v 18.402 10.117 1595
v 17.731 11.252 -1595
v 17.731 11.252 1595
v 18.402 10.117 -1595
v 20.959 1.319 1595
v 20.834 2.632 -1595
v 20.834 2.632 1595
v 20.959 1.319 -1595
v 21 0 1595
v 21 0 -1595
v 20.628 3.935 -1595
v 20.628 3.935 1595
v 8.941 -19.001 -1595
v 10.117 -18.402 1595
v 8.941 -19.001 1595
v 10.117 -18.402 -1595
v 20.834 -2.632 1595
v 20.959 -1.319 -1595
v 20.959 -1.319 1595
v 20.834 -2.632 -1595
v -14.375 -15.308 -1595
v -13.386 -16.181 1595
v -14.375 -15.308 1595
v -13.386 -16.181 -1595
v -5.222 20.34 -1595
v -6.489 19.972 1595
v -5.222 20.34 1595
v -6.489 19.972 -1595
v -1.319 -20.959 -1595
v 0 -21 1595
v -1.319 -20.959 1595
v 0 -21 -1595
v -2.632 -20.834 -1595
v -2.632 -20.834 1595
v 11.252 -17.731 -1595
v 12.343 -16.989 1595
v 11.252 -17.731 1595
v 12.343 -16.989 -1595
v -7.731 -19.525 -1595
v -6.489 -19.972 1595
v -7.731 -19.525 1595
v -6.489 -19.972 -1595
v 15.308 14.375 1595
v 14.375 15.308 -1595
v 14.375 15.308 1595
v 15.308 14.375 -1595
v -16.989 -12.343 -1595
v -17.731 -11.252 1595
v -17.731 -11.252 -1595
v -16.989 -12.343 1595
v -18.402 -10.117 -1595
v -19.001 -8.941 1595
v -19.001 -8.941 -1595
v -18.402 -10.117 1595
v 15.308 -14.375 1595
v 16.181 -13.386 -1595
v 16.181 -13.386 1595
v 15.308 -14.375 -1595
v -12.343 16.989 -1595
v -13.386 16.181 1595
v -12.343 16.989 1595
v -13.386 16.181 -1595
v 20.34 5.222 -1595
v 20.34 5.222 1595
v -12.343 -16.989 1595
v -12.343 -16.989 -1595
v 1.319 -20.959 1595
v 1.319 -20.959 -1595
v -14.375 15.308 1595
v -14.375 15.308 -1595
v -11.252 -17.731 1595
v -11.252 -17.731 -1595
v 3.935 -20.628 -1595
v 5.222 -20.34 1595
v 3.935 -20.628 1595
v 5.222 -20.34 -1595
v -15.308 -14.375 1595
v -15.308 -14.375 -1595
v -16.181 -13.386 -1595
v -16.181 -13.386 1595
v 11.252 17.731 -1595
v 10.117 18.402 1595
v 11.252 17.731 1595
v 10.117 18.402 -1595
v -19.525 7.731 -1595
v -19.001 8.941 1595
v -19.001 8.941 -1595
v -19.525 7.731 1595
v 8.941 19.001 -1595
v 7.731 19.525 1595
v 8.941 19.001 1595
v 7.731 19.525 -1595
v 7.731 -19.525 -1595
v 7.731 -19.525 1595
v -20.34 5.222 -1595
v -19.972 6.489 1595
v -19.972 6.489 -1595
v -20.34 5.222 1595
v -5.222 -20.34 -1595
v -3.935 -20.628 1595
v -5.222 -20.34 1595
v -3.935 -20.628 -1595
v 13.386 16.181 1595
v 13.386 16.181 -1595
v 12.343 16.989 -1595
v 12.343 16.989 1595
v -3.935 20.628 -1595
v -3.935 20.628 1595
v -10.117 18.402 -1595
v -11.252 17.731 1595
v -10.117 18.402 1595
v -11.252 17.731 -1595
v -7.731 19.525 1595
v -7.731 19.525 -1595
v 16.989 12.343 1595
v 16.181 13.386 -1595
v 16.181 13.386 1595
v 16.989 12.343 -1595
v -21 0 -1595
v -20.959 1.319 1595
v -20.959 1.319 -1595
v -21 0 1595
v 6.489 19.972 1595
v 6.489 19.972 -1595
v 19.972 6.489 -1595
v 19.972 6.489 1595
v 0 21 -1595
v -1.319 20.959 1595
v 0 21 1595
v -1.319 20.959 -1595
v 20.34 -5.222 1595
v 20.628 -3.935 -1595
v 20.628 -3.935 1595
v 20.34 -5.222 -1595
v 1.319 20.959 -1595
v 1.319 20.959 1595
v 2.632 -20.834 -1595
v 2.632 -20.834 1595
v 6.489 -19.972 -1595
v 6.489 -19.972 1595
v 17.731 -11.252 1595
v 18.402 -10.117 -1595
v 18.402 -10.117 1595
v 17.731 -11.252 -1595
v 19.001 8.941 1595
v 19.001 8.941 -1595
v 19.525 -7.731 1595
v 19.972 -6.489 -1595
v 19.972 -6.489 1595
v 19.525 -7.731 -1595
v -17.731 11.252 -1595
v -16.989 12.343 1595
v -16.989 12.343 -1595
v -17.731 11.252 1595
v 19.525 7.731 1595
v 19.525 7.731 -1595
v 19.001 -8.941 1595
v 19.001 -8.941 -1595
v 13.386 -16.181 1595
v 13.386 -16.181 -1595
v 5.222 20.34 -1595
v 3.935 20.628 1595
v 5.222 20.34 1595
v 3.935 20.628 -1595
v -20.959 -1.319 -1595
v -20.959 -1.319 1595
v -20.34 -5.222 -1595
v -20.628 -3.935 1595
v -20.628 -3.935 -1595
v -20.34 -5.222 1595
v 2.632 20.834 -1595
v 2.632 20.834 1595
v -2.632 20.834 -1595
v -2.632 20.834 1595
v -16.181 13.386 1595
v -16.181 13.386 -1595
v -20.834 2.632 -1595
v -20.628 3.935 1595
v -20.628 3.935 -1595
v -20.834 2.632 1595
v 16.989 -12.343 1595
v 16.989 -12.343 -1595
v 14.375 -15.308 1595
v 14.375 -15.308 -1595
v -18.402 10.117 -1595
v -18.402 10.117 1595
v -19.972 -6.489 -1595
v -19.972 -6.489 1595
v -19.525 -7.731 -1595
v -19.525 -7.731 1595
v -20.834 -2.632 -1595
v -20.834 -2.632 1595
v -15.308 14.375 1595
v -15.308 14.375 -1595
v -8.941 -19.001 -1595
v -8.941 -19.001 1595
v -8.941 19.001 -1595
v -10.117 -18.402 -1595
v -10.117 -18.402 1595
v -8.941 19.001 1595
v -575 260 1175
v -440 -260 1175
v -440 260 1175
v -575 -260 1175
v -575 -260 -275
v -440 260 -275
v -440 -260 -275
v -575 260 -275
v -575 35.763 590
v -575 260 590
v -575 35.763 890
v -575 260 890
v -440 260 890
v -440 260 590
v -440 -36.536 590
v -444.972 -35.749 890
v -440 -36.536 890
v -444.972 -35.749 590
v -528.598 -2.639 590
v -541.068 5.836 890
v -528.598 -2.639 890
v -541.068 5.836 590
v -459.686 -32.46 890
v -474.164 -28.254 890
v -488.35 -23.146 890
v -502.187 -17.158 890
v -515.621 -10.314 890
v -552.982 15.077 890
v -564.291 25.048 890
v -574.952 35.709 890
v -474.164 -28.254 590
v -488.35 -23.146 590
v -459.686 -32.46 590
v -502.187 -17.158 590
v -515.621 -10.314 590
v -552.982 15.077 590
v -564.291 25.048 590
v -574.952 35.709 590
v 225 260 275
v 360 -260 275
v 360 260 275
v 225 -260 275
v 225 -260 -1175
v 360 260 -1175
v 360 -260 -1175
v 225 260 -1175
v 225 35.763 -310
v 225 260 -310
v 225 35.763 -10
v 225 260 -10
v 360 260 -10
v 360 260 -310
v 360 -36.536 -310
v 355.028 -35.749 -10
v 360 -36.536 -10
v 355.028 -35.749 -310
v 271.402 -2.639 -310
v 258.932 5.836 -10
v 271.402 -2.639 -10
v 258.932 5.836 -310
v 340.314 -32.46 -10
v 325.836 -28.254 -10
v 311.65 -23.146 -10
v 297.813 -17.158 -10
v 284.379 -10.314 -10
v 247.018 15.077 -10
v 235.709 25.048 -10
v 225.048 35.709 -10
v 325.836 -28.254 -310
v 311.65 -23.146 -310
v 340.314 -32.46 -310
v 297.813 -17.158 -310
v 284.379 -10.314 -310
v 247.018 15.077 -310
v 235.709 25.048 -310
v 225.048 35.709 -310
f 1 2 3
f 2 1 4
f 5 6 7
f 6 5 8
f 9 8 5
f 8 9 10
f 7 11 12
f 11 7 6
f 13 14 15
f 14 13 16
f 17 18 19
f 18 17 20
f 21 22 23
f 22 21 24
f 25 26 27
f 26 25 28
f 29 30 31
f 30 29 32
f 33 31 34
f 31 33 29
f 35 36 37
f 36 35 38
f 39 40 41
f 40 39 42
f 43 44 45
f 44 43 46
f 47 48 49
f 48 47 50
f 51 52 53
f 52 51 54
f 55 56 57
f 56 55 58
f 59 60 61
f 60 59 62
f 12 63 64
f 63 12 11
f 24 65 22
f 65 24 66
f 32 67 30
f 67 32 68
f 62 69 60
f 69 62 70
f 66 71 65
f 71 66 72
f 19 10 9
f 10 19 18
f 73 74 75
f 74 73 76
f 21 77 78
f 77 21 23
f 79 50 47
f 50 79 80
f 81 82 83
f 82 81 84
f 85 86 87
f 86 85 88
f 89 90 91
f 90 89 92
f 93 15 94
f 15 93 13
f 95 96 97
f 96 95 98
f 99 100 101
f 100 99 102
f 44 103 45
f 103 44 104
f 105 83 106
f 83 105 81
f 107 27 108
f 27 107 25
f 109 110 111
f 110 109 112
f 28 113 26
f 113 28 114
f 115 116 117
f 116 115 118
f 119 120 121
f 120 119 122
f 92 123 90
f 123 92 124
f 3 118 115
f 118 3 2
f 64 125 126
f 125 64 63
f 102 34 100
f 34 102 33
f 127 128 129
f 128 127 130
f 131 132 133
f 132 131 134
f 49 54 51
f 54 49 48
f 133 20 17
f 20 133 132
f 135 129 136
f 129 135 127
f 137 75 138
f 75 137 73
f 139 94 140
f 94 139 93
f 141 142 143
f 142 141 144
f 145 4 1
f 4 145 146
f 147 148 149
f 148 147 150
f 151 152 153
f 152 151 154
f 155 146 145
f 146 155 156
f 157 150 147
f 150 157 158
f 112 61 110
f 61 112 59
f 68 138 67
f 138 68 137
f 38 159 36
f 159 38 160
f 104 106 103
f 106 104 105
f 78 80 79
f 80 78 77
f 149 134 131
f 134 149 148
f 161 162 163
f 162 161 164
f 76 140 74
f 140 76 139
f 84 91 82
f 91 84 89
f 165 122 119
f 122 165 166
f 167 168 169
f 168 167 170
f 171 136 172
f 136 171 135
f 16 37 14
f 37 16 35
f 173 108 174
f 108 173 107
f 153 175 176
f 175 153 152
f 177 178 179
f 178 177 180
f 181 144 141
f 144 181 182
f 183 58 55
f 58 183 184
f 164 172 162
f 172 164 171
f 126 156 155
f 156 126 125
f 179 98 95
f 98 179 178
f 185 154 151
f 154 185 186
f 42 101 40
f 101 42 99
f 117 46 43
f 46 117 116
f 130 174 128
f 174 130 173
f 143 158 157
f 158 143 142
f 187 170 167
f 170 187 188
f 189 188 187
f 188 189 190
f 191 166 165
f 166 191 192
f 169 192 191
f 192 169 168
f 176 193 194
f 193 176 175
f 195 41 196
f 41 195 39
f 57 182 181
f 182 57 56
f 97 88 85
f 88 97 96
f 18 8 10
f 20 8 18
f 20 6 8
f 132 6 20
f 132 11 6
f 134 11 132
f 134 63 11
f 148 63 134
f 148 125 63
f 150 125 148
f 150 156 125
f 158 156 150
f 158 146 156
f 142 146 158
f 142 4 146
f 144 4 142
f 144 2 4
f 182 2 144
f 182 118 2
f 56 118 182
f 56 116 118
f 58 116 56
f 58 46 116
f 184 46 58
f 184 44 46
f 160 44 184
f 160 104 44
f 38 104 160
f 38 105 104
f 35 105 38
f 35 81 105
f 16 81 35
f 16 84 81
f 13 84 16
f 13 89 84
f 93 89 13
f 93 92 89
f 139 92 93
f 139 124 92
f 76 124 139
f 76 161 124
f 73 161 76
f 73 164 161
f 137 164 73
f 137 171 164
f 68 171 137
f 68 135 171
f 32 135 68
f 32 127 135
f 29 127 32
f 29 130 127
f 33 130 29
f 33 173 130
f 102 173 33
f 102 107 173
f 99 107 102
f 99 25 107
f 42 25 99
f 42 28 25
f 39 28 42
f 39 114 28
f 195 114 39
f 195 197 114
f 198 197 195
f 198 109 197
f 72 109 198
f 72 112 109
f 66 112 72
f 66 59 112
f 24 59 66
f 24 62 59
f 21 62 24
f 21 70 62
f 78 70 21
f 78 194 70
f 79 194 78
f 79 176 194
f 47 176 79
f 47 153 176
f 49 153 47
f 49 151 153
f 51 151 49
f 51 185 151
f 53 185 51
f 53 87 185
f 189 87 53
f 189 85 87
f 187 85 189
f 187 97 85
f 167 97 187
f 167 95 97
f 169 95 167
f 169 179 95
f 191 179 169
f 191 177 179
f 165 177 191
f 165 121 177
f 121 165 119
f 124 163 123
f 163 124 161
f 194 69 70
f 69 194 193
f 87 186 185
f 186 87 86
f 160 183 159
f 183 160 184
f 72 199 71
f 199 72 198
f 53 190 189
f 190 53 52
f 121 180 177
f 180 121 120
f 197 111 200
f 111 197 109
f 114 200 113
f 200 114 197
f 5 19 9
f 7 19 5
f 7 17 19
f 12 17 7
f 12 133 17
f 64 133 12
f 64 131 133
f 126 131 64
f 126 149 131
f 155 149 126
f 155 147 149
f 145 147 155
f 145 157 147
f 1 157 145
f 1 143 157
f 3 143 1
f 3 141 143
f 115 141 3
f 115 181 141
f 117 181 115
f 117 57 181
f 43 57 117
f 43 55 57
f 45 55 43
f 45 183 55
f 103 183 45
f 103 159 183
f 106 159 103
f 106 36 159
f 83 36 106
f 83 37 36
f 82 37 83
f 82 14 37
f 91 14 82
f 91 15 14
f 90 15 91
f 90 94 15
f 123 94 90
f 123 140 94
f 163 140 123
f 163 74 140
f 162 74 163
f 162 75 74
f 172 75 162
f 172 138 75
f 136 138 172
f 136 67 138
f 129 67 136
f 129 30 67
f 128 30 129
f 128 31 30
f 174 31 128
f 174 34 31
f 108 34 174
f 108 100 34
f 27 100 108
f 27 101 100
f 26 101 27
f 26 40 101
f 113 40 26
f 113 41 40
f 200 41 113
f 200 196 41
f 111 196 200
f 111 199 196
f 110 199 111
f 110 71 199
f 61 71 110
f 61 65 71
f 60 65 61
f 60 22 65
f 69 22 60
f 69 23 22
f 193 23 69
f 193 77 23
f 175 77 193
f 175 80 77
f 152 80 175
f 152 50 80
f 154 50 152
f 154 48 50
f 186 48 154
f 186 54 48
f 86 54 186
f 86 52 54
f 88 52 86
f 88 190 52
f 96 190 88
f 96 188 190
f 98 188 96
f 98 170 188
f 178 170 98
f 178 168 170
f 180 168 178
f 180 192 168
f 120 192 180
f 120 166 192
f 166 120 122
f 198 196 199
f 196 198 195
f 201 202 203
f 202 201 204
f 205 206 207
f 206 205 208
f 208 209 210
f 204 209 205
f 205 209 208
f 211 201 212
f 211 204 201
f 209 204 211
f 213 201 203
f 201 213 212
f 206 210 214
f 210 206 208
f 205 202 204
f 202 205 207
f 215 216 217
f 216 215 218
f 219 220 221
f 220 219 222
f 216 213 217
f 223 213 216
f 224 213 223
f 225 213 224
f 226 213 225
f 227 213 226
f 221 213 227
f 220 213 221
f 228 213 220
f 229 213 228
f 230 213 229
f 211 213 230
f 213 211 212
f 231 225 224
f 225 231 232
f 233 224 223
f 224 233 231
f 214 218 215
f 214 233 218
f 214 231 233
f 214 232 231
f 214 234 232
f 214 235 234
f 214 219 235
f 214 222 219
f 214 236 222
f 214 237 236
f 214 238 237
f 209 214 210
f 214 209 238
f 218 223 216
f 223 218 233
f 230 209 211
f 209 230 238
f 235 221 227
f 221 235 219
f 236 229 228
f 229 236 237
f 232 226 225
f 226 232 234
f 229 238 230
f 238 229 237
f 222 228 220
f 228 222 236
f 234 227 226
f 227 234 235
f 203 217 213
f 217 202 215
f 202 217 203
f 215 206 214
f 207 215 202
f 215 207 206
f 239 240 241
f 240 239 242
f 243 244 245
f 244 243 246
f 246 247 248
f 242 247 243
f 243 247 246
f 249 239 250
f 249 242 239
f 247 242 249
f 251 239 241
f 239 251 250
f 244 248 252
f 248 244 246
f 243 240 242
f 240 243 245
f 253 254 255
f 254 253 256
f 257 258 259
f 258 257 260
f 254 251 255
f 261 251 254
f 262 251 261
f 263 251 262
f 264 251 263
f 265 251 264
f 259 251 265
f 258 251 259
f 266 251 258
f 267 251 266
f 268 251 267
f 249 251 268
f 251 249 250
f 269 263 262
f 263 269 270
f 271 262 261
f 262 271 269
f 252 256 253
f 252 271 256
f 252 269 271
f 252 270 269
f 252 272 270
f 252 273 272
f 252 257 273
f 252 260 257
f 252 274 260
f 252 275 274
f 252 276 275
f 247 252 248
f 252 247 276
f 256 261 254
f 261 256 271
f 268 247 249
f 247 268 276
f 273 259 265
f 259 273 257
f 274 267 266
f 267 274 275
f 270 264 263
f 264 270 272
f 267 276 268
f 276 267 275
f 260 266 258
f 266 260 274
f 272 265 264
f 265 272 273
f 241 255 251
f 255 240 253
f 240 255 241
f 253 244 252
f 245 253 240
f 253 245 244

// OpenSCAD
// ============================================================================
// PROJECT: XXXG-00W0 WING GUNDAM ZERO EW - THRUST PROFILE MATING
// COMPONENT VAULT: BANDAI CAST RUNNER B - BACKPACK MOUNTING PLATES B19 & B20
// MANUFACTURING SPECS: SOLID-STATE CAST-IN INDUCTIVE POWER HARNESS CONTACTS
// ENGINEERING PARITY: HIGH-LOAD LOAD ENCLOSURE FOR 1:1 SCALED 16.7M CHASSIS
// ============================================================================

$fn = 100; // Circular segment resolution calculation count

// Sizing Constants Scaled 1:1 for a 16.7-Meter Airframe Scale (mm)
backpack_plate_height = 1450;           // Total vertical mounting span (mm)
wing_hinge_bore_diameter = 480;         // Primary wing arm pivot track width (mm)
titanium_armor_wall = 60;               // Heavy solid TiAl plate thickness (mm)
harness_conduit_width = 80;             // Cast-in 4oz copper logic trace track (mm)

module Runner_B_Backpack_Plates_Forge() {
    // Central Supply Injection Runner Axis (Molten Feed Line from Siphon Forge)
    color([0.22, 0.22, 0.24]) {
        cylinder(h = backpack_plate_height * 2.2, d = 42, center = true);
        // Direct injection gates tracking straight into the part mold cavities
        translate() rotate() cylinder(h = 450, d = 22);
        translate([0, 0, -500]) rotate() cylinder(h = 450, d = 22);
    }
    
    // Instantiate Scaled Structural Molds Symmetrically (Left & Right Halves)
    Cast_Backpack_Mounting_Plates();
}

module Cast_Backpack_Mounting_Plates() {
    // ---- PART B19: LEFT EXTERIOR BACKPACK STRUCTURAL PLATE ---- [Page 18, Step 10-1]
    translate([-400, 0, 450]) color([0.7, 0.7, 0.75]) { // Standard Armor Grey Spec
        difference() {
            // Main solid high-strength external mounting shell plate
            cube([350, 520, backpack_plate_height], center = true);
            
            // Integrated Wing Joint Articulation Hinge Axis Clearance Bore
            translate([0, (520/2 - titanium_armor_wall), (backpack_plate_height * 0.2)])
                rotate()
                    cylinder(h = 300, d = wing_hinge_bore_diameter, center = true);
            
            // Continuous cast-in contact pad slots for the 4oz power bus links
            cube([harness_conduit_width, 520 + 10, backpack_plate_height + 10], center = true);
            
            // Slicing profile tool to generate an asymmetrical half-shell part component
            translate([400, 0, 0])
                cube([800, 600, backpack_plate_height * 2], center = true);
        }
    }
    
    // ---- PART B20: RIGHT EXTERIOR BACKPACK STRUCTURAL PLATE ---- [Page 18, Step 10-1]
    translate([400, 0, -450]) rotate() color([0.7, 0.7, 0.75]) {
        difference() {
            cube([350, 520, backpack_plate_height], center = true);
            translate([0, (520/2 - titanium_armor_wall), (backpack_plate_height * 0.2)])
                rotate()
                    cylinder(h = 300, d = wing_hinge_bore_diameter, center = true);
            cube([harness_conduit_width, 520 + 10, backpack_plate_height + 10], center = true);
            translate([400, 0, 0])
                cube([800, 600, backpack_plate_height * 2], center = true);
        }
    }
}

// Render Master Assembly to Parameter Workspace
Runner_B_Backpack_Plates_Forge();
